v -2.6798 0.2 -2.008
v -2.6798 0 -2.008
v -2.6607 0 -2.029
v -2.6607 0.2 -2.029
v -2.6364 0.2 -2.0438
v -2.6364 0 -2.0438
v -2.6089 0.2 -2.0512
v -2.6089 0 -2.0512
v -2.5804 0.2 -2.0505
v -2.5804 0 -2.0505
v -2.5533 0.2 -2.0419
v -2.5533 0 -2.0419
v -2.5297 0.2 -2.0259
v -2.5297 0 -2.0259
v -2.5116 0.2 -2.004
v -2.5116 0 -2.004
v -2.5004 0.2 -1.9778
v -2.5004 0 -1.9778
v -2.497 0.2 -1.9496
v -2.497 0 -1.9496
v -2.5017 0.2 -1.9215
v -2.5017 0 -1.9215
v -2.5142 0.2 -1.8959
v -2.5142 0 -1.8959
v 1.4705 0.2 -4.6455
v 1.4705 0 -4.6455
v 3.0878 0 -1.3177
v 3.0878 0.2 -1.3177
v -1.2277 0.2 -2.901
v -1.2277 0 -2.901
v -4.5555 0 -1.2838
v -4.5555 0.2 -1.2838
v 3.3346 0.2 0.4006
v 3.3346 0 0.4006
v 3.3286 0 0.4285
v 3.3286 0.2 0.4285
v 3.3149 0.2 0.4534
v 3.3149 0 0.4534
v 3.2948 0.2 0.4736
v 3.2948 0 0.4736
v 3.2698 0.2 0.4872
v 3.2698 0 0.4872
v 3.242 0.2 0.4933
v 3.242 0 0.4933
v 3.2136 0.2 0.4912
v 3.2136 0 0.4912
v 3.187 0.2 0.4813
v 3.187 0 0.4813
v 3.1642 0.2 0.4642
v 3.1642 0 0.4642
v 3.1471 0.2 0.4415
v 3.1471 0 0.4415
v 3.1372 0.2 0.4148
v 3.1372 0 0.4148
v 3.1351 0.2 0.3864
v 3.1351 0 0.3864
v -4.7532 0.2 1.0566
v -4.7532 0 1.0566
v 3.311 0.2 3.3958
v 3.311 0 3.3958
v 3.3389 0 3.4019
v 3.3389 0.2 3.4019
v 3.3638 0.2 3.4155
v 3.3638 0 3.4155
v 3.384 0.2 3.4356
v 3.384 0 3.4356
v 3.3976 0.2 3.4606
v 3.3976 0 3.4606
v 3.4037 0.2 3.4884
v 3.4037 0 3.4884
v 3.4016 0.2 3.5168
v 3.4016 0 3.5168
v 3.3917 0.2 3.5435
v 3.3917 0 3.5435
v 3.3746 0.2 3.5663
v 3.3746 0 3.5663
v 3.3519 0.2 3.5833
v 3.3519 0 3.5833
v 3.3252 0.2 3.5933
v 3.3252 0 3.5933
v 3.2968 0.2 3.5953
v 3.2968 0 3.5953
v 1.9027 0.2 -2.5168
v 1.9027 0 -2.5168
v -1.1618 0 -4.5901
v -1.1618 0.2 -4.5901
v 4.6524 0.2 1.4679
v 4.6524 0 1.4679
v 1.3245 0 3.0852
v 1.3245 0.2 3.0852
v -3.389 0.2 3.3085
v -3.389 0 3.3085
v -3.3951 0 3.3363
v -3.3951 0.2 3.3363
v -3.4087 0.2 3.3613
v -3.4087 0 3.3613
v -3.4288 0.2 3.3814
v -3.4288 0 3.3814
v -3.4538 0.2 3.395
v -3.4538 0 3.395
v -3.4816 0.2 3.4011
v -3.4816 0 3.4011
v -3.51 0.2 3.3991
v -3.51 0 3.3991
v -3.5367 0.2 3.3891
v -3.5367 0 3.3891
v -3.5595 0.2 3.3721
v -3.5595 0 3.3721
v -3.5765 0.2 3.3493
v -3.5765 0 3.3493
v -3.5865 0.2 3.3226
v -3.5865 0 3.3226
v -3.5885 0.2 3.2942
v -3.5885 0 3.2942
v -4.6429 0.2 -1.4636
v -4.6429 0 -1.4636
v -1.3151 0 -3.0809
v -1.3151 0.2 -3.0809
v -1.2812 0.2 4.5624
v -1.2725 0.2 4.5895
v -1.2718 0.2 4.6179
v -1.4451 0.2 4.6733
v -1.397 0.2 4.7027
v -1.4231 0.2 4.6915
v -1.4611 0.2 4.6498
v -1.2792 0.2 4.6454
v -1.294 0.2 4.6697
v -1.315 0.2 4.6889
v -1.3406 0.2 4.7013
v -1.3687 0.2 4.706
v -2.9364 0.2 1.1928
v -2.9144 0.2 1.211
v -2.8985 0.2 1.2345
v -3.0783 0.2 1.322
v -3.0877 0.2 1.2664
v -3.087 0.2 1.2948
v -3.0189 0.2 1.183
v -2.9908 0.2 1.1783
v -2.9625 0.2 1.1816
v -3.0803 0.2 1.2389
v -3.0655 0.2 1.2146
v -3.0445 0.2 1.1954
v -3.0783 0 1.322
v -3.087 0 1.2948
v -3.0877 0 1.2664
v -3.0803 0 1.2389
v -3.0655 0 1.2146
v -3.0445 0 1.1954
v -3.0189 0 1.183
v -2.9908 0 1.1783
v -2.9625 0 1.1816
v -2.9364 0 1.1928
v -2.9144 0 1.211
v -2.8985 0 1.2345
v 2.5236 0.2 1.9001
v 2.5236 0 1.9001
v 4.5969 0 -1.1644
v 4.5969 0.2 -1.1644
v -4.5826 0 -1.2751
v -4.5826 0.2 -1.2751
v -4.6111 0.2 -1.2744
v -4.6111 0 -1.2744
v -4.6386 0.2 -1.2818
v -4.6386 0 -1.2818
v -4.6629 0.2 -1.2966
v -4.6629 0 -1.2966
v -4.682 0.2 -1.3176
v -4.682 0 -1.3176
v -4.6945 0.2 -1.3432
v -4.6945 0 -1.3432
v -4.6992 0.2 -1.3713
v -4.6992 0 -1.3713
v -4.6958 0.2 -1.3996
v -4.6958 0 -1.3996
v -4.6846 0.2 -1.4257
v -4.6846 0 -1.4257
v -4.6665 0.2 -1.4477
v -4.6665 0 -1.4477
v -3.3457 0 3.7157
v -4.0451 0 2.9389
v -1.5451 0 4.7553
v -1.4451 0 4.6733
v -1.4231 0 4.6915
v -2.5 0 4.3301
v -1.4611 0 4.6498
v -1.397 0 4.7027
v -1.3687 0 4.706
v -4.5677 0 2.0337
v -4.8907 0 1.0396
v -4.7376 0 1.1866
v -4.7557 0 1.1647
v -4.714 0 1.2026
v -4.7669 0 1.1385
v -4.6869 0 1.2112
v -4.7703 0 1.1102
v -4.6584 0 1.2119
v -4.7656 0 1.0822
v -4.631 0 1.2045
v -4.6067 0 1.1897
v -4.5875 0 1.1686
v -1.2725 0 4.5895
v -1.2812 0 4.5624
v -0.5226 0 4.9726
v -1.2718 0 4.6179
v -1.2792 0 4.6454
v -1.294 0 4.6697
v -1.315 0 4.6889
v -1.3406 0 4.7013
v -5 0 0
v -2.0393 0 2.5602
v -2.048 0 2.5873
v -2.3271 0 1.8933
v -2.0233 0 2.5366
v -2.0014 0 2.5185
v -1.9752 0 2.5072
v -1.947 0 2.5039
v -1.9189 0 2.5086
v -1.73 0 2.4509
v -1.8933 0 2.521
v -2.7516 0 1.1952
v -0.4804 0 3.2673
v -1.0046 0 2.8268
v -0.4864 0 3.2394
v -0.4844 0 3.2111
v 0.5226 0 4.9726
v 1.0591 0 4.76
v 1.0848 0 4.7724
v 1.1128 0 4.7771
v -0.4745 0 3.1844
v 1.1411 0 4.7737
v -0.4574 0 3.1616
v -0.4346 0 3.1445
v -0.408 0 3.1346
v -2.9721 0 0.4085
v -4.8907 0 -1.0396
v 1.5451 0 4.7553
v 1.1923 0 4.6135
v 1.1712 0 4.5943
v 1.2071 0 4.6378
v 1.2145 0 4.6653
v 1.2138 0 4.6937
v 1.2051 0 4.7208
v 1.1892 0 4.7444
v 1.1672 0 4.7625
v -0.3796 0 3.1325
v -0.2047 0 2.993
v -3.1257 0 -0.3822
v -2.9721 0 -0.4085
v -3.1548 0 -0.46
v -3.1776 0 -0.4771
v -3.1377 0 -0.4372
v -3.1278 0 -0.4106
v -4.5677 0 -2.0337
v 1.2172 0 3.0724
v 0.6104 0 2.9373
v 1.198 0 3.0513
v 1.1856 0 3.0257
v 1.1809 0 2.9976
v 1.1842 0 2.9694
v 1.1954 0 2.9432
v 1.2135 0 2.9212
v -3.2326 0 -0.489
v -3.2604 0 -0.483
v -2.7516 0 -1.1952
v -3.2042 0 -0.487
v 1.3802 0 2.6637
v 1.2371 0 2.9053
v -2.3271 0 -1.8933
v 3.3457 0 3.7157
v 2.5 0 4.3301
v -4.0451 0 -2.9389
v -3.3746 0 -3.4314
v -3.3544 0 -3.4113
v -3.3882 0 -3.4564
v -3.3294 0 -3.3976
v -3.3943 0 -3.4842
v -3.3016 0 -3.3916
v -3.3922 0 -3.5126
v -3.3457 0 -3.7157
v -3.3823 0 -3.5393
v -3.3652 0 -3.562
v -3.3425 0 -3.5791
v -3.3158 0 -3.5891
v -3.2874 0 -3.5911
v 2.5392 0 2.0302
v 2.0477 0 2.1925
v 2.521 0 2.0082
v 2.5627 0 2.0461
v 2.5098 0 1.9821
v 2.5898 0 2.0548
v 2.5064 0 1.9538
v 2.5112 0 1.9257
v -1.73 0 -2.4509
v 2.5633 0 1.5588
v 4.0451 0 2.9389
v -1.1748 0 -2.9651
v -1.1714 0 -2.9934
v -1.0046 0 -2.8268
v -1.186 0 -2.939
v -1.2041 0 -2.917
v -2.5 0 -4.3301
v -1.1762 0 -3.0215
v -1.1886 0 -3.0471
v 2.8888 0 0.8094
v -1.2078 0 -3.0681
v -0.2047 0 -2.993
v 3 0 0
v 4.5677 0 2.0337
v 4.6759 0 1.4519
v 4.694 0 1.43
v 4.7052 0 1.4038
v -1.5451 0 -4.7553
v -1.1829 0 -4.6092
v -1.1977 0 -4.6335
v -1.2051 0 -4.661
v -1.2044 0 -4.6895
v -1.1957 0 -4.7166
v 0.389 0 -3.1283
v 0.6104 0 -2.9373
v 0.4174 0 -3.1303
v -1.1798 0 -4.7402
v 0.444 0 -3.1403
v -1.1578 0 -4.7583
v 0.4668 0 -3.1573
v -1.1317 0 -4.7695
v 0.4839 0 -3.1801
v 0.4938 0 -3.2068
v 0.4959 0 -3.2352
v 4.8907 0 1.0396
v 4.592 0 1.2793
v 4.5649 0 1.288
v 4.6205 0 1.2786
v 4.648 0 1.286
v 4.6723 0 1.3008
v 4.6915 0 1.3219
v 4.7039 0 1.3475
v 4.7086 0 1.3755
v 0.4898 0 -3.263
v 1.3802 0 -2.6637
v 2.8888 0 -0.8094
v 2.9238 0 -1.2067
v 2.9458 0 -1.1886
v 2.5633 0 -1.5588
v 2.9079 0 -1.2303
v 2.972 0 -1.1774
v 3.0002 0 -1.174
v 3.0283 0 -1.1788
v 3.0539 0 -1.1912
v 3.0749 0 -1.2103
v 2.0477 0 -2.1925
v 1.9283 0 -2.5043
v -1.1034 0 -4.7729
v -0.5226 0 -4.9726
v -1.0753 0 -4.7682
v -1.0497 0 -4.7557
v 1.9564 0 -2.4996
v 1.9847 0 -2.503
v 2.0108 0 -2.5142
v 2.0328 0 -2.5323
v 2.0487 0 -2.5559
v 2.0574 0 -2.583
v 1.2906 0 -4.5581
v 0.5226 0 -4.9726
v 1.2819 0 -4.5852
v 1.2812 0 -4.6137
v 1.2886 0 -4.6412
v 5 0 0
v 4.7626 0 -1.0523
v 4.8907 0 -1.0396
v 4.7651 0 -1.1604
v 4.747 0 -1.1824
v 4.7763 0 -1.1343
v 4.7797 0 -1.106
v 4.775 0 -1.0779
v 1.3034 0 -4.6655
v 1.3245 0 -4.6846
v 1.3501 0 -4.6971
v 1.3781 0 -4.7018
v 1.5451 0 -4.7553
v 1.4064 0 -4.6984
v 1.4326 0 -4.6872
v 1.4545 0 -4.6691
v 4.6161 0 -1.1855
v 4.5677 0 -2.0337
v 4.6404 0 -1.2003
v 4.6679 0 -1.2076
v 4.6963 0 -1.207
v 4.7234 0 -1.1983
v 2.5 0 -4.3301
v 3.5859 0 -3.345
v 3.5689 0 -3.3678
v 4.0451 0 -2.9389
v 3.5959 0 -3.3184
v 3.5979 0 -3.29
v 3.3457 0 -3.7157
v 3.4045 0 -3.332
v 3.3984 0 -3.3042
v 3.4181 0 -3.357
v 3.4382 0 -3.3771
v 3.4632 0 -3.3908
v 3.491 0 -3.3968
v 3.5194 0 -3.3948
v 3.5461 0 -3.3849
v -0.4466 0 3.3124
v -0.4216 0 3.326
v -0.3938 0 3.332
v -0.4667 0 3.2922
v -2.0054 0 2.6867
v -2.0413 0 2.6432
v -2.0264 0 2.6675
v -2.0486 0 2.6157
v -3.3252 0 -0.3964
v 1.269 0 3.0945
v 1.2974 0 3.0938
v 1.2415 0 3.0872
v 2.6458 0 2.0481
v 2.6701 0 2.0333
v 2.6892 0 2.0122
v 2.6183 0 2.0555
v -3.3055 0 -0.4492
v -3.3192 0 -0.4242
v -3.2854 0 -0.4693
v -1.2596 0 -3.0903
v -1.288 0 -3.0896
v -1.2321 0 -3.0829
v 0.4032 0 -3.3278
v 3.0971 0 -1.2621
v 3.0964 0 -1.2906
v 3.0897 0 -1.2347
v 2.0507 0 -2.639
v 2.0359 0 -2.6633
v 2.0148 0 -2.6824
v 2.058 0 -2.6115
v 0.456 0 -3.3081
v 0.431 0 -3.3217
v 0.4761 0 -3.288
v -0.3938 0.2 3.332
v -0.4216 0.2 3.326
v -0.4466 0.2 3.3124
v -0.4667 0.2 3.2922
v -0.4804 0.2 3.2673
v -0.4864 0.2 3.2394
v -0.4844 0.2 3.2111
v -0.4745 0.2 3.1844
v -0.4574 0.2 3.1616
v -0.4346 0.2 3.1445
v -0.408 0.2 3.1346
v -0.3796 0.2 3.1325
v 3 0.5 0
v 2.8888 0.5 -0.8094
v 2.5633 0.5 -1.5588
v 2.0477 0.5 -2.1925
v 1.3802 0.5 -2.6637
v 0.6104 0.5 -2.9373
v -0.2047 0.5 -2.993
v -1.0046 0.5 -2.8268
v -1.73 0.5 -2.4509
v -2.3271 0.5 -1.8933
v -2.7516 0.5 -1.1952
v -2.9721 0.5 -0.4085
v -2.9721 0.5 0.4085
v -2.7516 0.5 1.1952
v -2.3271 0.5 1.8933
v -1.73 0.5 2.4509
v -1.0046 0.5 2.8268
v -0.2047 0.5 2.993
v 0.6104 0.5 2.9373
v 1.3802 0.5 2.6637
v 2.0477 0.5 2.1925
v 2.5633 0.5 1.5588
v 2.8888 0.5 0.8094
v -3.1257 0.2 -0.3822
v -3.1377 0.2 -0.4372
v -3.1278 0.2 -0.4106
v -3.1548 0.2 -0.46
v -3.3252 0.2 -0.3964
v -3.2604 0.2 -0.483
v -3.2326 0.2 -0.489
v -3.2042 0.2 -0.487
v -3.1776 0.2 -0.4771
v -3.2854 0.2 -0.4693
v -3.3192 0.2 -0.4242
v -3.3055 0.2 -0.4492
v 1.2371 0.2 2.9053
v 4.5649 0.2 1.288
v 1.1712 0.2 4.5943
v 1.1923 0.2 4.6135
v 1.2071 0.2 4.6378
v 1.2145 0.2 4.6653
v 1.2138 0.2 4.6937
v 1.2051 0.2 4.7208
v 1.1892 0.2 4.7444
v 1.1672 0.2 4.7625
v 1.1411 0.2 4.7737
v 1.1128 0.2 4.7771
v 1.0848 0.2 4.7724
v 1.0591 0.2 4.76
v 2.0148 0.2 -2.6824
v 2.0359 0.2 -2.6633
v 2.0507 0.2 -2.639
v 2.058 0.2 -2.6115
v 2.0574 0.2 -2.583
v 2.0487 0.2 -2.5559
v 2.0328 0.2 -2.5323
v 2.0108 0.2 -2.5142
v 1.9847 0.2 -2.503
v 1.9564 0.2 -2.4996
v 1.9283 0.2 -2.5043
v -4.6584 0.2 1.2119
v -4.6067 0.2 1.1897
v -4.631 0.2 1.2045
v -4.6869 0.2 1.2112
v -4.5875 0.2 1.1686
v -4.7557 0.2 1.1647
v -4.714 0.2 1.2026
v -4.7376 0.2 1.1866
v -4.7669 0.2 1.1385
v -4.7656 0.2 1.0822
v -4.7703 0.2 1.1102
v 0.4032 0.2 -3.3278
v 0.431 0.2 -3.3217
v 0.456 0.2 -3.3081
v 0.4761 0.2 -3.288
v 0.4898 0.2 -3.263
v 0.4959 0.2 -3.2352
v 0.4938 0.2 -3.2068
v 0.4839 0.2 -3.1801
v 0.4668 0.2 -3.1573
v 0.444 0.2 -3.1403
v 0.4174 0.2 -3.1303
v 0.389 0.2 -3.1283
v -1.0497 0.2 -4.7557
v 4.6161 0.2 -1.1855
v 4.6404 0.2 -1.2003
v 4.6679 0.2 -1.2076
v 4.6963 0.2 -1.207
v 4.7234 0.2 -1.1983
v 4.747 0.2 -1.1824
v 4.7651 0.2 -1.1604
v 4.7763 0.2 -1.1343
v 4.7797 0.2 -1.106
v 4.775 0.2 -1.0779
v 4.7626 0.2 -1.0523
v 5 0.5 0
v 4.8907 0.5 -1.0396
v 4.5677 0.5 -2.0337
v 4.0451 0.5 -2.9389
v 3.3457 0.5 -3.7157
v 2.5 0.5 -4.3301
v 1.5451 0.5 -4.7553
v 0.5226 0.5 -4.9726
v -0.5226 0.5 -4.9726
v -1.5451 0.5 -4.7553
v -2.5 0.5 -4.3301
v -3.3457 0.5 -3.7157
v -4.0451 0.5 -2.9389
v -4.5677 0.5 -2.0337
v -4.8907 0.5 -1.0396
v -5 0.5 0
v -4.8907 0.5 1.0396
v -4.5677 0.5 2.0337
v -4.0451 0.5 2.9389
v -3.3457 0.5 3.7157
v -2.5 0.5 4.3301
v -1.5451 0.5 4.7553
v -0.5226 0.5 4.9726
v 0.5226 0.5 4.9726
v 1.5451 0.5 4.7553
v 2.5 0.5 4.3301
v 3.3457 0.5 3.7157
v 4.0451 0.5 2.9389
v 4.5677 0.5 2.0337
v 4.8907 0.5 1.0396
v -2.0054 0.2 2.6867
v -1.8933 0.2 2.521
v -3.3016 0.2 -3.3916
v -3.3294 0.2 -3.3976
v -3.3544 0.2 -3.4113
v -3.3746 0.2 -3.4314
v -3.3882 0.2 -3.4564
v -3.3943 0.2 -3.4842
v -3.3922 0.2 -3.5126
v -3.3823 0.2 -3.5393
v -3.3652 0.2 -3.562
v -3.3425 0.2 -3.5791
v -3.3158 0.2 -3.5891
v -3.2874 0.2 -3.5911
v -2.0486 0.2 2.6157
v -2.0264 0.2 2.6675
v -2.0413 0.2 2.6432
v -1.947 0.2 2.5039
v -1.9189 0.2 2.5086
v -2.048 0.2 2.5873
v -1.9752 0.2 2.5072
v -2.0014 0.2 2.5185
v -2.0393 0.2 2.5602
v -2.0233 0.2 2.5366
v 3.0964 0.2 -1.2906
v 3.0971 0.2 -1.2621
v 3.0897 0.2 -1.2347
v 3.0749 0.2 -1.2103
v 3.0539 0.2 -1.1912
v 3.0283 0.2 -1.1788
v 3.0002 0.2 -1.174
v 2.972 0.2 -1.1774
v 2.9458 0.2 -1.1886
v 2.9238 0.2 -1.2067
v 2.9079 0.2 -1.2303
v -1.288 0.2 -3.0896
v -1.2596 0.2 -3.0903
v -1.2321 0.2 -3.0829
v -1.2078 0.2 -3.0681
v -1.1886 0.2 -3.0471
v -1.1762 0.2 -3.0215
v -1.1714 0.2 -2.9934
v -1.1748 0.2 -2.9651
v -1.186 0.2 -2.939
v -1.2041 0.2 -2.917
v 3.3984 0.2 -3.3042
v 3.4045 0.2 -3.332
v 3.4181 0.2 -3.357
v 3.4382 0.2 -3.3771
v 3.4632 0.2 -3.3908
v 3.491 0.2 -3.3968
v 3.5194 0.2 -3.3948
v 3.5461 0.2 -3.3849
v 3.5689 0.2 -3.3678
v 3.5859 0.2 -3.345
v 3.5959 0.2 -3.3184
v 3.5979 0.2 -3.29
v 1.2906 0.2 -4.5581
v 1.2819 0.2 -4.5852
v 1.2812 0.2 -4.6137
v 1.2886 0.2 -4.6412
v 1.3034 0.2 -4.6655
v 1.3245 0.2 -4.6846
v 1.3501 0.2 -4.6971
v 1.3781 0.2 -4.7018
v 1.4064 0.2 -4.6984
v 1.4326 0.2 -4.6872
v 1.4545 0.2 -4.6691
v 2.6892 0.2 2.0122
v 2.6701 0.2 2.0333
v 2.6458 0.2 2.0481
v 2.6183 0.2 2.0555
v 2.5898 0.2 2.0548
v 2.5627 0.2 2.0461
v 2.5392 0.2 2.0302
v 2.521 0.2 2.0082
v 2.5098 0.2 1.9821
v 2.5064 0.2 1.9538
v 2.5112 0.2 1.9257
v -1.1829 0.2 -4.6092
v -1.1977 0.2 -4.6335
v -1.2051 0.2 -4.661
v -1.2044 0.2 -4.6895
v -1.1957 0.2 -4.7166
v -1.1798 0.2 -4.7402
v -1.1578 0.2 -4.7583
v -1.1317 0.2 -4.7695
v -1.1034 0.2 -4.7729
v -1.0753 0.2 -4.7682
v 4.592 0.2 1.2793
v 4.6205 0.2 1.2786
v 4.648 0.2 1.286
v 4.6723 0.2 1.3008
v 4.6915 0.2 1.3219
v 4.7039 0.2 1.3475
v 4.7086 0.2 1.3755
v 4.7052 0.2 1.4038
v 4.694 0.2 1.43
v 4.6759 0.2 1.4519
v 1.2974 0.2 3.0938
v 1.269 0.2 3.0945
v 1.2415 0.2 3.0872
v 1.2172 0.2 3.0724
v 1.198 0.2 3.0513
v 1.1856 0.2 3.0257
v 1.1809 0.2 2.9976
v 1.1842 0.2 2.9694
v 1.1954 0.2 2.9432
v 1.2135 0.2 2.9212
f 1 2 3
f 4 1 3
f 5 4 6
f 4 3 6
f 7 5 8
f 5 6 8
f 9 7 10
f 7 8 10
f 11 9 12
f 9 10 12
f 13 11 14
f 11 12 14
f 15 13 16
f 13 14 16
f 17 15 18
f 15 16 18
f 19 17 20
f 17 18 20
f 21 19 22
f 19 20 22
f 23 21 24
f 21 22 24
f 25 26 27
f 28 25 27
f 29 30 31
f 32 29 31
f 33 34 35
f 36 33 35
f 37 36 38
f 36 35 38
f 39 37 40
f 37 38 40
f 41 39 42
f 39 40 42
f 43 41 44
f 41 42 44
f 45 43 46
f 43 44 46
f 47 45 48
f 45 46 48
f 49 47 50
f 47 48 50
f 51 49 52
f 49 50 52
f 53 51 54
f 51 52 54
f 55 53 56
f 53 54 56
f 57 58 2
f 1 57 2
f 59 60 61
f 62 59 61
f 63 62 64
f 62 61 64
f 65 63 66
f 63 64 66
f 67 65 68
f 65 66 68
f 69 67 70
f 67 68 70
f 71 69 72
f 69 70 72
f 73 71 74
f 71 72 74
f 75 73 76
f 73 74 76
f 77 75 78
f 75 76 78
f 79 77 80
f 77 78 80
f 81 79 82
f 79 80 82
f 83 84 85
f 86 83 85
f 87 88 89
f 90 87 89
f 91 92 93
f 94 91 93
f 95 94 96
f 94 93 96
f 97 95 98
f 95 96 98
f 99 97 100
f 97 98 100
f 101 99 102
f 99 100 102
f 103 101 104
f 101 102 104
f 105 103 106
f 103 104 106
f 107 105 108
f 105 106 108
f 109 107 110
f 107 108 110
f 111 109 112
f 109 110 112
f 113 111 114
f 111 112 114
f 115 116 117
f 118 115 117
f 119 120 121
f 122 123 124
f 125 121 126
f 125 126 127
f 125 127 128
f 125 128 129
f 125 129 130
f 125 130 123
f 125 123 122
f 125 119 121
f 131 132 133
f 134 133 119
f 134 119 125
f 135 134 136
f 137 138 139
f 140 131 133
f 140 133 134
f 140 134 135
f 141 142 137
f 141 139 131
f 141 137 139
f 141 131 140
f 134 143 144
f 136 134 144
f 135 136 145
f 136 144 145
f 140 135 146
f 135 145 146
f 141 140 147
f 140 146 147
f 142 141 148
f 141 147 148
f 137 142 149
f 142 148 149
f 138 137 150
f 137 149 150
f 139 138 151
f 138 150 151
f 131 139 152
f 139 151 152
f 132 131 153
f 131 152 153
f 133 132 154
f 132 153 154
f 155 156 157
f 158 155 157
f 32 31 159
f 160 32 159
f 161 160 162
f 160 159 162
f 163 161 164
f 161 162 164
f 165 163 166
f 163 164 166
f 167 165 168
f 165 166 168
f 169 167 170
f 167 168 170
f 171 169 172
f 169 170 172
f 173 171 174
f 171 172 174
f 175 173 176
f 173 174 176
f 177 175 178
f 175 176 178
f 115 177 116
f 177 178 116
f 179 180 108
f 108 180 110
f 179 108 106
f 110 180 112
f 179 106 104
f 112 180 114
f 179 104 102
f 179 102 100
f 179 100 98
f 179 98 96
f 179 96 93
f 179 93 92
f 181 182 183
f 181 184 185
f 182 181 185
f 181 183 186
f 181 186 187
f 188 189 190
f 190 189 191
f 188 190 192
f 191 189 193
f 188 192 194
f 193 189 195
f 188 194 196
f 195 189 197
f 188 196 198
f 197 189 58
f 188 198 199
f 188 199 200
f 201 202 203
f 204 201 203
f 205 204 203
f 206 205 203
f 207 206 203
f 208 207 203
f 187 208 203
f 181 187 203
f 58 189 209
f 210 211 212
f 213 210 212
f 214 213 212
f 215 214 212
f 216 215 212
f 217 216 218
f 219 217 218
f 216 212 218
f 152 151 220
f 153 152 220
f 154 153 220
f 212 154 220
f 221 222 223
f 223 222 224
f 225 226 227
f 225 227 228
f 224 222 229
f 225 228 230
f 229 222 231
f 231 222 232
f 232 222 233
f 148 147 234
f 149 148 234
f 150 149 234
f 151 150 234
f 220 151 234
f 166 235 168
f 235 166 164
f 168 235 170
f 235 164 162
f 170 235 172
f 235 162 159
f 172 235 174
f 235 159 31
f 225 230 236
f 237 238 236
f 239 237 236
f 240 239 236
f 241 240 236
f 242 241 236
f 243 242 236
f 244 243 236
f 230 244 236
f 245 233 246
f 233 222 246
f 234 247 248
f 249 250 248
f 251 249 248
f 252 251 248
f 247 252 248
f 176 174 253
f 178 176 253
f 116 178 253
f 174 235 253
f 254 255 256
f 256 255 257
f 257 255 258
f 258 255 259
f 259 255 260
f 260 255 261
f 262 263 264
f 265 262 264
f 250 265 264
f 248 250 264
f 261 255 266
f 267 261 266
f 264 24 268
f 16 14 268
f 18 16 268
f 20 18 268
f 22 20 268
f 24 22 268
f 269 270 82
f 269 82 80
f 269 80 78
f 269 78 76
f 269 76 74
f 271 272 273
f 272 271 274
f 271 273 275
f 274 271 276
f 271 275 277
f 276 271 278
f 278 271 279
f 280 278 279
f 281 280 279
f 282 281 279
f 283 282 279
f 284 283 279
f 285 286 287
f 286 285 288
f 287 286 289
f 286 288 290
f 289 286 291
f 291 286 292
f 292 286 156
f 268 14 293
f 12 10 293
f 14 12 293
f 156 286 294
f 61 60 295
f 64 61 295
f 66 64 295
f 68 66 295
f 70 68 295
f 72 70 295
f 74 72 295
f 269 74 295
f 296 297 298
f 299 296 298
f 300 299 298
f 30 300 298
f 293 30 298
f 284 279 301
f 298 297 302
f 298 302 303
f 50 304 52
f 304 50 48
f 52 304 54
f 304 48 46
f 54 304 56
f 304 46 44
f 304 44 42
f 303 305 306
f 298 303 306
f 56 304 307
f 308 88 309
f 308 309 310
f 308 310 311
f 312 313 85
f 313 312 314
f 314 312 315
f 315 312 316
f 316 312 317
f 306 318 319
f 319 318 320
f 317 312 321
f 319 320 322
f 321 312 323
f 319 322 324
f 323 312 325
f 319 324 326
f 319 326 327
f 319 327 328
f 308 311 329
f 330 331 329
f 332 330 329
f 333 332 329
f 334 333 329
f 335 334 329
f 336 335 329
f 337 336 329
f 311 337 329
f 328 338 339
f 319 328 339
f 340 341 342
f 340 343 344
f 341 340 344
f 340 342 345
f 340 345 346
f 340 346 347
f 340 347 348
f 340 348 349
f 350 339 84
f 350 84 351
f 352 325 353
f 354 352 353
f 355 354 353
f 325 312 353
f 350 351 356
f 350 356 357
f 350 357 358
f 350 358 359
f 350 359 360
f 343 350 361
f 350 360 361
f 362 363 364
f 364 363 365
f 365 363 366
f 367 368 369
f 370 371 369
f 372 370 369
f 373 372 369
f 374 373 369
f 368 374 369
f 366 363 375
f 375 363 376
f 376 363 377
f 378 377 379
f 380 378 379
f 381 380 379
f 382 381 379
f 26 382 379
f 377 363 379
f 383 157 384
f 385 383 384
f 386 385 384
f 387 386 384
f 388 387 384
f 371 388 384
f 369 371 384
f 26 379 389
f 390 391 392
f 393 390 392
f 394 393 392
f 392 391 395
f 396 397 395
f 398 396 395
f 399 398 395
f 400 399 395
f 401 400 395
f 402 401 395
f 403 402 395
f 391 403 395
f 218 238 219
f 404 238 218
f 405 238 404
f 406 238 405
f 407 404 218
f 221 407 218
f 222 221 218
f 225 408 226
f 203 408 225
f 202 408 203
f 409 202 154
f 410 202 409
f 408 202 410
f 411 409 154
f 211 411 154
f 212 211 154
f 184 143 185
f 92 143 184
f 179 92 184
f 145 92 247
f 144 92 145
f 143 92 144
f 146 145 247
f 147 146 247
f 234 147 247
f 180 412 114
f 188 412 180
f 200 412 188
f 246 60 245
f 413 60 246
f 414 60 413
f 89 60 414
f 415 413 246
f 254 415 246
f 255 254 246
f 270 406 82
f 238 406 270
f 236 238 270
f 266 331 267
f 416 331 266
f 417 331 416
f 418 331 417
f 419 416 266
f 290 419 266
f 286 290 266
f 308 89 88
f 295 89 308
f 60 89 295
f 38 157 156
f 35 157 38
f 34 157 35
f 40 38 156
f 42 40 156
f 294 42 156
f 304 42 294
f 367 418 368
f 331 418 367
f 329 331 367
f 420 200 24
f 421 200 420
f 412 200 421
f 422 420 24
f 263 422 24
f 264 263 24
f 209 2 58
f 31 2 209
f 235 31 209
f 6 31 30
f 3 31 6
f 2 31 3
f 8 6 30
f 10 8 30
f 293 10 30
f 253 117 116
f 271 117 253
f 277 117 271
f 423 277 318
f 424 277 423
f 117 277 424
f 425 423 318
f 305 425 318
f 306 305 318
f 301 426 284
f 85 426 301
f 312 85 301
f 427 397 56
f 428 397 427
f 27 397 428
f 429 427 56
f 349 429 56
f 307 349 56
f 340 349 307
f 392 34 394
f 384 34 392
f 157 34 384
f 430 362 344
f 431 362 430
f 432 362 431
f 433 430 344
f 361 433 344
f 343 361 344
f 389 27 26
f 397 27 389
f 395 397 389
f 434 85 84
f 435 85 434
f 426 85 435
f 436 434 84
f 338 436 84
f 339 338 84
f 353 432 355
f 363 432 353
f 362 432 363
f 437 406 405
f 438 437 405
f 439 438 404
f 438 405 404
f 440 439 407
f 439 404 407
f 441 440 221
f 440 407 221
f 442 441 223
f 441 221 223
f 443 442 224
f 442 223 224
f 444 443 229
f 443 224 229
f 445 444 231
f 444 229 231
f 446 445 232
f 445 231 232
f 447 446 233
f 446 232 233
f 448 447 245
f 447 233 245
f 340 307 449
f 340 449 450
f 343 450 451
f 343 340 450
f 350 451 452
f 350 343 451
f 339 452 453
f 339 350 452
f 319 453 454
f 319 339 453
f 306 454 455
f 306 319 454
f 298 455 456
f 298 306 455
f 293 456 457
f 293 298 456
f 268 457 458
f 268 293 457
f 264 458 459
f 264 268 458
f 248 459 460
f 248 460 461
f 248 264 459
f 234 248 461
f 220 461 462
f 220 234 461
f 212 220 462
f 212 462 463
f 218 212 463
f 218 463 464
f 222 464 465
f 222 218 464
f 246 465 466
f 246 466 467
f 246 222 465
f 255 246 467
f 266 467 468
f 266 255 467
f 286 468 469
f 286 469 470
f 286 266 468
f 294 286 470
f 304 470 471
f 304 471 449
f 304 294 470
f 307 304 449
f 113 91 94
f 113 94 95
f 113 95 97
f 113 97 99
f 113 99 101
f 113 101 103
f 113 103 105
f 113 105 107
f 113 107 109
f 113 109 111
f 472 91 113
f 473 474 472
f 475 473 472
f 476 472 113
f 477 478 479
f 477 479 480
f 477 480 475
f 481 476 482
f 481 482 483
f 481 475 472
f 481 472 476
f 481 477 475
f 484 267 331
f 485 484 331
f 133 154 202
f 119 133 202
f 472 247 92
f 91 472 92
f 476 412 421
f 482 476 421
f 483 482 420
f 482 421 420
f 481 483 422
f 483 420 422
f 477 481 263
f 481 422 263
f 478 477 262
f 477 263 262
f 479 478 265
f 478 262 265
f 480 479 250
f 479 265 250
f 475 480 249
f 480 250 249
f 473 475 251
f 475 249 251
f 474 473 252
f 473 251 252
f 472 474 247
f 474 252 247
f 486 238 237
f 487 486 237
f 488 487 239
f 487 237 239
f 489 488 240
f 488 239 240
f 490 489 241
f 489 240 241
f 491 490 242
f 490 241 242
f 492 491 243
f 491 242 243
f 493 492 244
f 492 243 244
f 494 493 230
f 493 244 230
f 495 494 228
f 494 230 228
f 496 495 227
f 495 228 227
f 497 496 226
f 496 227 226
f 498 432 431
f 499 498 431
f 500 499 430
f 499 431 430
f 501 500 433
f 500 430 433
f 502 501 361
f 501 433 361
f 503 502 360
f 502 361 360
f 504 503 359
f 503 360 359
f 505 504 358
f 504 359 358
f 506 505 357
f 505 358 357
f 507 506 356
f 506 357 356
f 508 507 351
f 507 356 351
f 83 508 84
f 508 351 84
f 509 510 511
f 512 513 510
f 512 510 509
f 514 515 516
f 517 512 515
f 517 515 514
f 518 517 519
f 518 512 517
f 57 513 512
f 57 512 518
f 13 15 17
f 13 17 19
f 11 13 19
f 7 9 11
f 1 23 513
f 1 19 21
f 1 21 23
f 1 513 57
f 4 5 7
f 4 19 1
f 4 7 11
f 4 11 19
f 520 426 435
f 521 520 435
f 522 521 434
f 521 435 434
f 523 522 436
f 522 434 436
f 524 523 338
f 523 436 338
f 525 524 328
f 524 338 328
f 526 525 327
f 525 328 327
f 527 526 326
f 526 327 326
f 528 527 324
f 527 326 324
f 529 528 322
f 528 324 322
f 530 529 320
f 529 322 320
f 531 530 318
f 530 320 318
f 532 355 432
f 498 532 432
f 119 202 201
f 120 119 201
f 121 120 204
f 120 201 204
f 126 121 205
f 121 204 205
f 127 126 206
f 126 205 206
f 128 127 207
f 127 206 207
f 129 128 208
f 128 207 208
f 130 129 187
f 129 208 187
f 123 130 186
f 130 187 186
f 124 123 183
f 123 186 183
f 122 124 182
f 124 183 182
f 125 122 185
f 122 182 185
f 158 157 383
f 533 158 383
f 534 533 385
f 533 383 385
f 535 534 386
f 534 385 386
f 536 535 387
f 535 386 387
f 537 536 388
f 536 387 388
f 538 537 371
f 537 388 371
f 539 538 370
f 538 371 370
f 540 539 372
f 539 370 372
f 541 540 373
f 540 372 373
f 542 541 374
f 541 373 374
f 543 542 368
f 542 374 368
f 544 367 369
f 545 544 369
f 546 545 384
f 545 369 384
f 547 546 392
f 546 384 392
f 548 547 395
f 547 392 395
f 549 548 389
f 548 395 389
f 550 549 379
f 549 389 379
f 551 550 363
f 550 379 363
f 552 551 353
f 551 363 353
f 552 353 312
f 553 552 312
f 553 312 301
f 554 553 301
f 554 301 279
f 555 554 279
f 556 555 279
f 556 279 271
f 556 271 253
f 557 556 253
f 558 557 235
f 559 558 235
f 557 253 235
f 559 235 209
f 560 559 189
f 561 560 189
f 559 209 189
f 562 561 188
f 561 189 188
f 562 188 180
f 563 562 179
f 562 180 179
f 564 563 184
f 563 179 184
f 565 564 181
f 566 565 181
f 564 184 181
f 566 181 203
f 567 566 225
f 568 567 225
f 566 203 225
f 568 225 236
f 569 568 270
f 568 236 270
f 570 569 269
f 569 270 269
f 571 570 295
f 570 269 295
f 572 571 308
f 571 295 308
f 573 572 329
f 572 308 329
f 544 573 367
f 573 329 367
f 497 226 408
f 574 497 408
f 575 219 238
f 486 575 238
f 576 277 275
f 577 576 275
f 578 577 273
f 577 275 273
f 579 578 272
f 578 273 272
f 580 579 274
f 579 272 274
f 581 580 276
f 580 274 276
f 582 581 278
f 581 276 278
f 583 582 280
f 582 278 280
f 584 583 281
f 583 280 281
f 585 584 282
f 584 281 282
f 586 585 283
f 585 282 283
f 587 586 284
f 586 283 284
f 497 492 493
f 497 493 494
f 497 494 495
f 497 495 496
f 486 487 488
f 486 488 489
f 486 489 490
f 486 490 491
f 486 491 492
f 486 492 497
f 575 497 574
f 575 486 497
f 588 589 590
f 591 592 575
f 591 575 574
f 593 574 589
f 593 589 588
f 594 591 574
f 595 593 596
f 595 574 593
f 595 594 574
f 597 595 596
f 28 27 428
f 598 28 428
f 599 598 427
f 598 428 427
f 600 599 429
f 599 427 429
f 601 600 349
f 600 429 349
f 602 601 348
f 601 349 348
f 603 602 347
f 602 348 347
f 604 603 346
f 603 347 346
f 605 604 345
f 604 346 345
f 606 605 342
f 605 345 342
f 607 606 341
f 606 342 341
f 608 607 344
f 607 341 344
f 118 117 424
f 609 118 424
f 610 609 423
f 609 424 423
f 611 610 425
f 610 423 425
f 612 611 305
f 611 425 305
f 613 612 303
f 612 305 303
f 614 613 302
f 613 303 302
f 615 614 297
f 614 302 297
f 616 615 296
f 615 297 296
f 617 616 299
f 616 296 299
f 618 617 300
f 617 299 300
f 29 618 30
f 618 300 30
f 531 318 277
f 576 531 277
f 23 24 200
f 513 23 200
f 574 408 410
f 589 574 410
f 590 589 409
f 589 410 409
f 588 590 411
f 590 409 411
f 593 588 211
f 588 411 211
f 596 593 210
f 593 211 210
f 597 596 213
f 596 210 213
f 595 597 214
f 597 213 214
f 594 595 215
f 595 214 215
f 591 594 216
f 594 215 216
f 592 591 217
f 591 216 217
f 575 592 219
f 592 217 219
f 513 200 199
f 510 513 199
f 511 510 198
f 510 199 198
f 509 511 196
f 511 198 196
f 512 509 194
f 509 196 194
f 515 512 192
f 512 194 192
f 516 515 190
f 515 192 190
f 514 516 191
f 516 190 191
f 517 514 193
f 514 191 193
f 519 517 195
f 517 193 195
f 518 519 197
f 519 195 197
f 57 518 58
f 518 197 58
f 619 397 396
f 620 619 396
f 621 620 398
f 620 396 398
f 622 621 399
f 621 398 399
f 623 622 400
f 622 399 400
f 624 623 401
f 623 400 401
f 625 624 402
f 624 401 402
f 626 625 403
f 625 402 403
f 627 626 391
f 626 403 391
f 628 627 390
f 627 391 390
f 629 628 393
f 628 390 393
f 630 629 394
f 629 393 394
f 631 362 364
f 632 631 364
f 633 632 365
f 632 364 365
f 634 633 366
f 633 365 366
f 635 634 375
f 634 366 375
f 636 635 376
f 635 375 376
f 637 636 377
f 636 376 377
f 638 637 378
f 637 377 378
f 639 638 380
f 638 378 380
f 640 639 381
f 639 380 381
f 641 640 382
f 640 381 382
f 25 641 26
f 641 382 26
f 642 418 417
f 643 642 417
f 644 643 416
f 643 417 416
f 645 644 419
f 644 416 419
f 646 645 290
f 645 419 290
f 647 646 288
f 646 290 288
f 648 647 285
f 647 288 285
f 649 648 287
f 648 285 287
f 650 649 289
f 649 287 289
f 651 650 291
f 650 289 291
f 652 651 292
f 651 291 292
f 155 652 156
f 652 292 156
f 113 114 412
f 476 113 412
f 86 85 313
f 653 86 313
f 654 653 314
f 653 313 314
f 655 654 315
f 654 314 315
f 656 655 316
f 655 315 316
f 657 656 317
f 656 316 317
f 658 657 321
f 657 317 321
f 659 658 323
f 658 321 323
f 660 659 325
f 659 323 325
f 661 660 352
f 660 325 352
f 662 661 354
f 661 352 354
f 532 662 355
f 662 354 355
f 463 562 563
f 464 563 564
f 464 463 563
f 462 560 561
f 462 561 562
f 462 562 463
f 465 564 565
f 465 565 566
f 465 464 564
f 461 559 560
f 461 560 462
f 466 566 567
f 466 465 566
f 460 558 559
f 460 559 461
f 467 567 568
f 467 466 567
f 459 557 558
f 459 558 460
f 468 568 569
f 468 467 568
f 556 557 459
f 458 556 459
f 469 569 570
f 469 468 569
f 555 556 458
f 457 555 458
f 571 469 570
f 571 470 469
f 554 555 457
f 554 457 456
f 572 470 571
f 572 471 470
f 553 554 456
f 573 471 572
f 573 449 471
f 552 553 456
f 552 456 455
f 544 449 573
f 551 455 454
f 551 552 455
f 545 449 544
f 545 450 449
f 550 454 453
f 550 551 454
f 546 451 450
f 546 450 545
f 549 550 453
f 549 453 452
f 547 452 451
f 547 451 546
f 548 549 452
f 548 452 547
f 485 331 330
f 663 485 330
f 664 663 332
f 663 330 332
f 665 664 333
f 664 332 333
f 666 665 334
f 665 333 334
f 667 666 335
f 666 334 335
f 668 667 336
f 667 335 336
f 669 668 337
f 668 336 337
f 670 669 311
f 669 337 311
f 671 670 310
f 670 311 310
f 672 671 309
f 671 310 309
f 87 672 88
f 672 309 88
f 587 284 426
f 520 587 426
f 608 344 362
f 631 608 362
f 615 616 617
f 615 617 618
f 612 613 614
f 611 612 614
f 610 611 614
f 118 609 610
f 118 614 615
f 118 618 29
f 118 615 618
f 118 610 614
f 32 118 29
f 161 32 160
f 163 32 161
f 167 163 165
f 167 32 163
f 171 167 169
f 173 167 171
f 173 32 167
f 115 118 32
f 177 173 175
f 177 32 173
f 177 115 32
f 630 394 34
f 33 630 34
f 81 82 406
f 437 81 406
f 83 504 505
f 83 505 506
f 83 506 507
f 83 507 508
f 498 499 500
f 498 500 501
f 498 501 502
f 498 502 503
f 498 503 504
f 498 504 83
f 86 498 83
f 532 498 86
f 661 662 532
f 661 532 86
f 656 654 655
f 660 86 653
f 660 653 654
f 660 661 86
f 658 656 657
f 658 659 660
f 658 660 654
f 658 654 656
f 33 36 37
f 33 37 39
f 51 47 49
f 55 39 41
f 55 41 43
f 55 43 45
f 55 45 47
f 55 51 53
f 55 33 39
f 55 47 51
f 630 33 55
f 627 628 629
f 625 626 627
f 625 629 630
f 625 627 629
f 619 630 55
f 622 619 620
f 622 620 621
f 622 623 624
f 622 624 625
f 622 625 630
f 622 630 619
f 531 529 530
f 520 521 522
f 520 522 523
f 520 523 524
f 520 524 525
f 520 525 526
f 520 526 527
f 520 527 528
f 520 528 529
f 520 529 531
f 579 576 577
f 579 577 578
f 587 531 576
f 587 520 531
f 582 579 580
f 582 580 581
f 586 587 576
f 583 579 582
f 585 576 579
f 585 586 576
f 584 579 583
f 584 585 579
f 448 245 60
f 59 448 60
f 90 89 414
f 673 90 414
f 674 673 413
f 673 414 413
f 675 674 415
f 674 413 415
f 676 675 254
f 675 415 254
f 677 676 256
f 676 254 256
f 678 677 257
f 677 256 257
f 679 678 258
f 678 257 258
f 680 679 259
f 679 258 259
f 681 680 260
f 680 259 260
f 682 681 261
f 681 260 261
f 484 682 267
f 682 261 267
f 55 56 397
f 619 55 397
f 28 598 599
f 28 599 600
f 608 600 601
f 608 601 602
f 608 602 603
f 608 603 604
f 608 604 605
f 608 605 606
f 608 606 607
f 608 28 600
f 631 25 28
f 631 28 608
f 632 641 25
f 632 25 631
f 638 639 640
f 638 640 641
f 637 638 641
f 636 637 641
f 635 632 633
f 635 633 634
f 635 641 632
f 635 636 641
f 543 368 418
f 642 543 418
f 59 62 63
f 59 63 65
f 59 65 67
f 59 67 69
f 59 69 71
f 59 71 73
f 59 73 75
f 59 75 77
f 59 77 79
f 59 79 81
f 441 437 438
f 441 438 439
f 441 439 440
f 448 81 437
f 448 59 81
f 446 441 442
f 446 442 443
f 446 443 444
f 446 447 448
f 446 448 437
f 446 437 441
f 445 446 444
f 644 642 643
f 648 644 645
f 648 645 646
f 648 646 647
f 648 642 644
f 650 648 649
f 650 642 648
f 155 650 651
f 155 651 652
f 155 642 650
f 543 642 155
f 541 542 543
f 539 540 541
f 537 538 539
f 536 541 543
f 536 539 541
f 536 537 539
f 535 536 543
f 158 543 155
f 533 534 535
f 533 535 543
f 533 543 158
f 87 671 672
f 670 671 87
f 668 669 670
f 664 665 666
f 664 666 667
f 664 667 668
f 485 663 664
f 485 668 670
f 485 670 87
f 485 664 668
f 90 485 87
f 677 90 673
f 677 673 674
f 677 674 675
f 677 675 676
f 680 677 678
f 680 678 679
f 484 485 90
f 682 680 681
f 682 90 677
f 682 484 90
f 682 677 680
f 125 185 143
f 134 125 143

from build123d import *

# Parameters (mm, degrees)
SKETCH1_R           = 5
SKETCH1_R_2         = 3
BOSS_EXTRUDE2_DEPTH = 0.5
CUT_EXTRUDE5_DEPTH  = 0.2


with BuildPart() as part:
    # Sketch1 → Boss-Extrude2 (new body)
    with BuildSketch(Plane(origin=(0, 0, 0), x_dir=(1, 0, 0), z_dir=(0, 1, 0))):
        Circle(SKETCH1_R)
        Circle(SKETCH1_R_2, mode=Mode.SUBTRACT)
    extrude(amount=BOSS_EXTRUDE2_DEPTH)

    # Sketch4 → Cut-Extrude5 (cut)
    with BuildSketch(Plane(origin=(0, 0, 0), x_dir=(1, 0, 0), z_dir=(0, 1, 0))):
        with BuildLine():
            Line((-1.227705378, 2.901045691), (-4.555523725, 1.283756278))
            ThreePointArc((-4.555523725, 1.283756278), (-4.689175287, 1.32998679), (-4.642944775, 1.463638351))
            Line((-4.642944775, 1.463638351), (-1.315126427, 3.080927764))
            ThreePointArc((-1.315126427, 3.080927764), (-1.181474866, 3.034697252), (-1.227705378, 2.901045691))
        make_face()
        with BuildLine():
            Line((0.388990404, 3.128300785), (-3.301629531, 3.391596243))
            ThreePointArc((-3.301629531, 3.391596243), (-3.394259922, 3.498458821), (-3.287397344, 3.591089212))
            Line((-3.287397344, 3.591089212), (0.403222591, 3.327793755))
            ThreePointArc((0.403222591, 3.327793755), (0.495852982, 3.220931177), (0.388990404, 3.128300785))
        make_face()
        with BuildLine():
            Line((1.902717568, 2.516761579), (-1.161805322, 4.590092101))
            ThreePointArc((-1.161805322, 4.590092101), (-1.188594305, 4.728953005), (-1.049733402, 4.755741987))
            Line((-1.049733402, 4.755741987), (2.014789488, 2.682411465))
            ThreePointArc((2.014789488, 2.682411465), (2.041578471, 2.543550562), (1.902717568, 2.516761579))
        make_face()
        with BuildLine():
            Line((2.907874144, 1.230289509), (1.290584731, 4.558107857))
            ThreePointArc((1.290584731, 4.558107857), (1.336815243, 4.691759418), (1.470466804, 4.645528907))
            Line((1.470466804, 4.645528907), (3.087756217, 1.317710559))
            ThreePointArc((3.087756217, 1.317710559), (3.041525705, 1.184058998), (2.907874144, 1.230289509))
        make_face()
        with BuildLine():
            Line((3.135129238, -0.386406272), (3.398424696, 3.304213663))
            ThreePointArc((3.398424696, 3.304213663), (3.505287274, 3.396844054), (3.597917665, 3.289981476))
            Line((3.597917665, 3.289981476), (3.334622208, -0.400638459))
            ThreePointArc((3.334622208, -0.400638459), (3.22775963, -0.49326885), (3.135129238, -0.386406272))
        make_face()
        with BuildLine():
            Line((2.523590032, -1.900133436), (4.596920554, 1.164389454))
            ThreePointArc((4.596920554, 1.164389454), (4.735781458, 1.191178437), (4.76257044, 1.052317534))
            Line((4.76257044, 1.052317534), (2.689239918, -2.012205357))
            ThreePointArc((2.689239918, -2.012205357), (2.550379015, -2.038994339), (2.523590032, -1.900133436))
        make_face()
        with BuildLine():
            Line((1.237117962, -2.905290012), (4.56493631, -1.2880006))
            ThreePointArc((4.56493631, -1.2880006), (4.698587871, -1.334231111), (4.65235736, -1.467882672))
            Line((4.65235736, -1.467882672), (1.324539012, -3.085172085))
            ThreePointArc((1.324539012, -3.085172085), (1.190887451, -3.038941573), (1.237117962, -2.905290012))
        make_face()
        with BuildLine():
            Line((-0.379577819, -3.132545106), (3.311042116, -3.395840564))
            ThreePointArc((3.311042116, -3.395840564), (3.403672507, -3.502703142), (3.296809929, -3.595333533))
            Line((3.296809929, -3.595333533), (-0.393810006, -3.332038076))
            ThreePointArc((-0.393810006, -3.332038076), (-0.486440397, -3.225175498), (-0.379577819, -3.132545106))
        make_face()
        with BuildLine():
            Line((-1.893304983, -2.521005901), (1.171217907, -4.594336423))
            ThreePointArc((1.171217907, -4.594336423), (1.19800689, -4.733197326), (1.059145987, -4.759986309))
            Line((1.059145987, -4.759986309), (-2.005376904, -2.686655787))
            ThreePointArc((-2.005376904, -2.686655787), (-2.032165886, -2.547794883), (-1.893304983, -2.521005901))
        make_face()
        with BuildLine():
            Line((-2.898461559, -1.234533831), (-1.281172147, -4.562352178))
            ThreePointArc((-1.281172147, -4.562352178), (-1.327402658, -4.69600374), (-1.461054219, -4.649773228))
            Line((-1.461054219, -4.649773228), (-3.078343632, -1.32195488))
            ThreePointArc((-3.078343632, -1.32195488), (-3.03211312, -1.188303319), (-2.898461559, -1.234533831))
        make_face()
        with BuildLine():
            Line((-3.125716653, 0.382161951), (-3.389012111, -3.308457984))
            ThreePointArc((-3.389012111, -3.308457984), (-3.495874689, -3.401088375), (-3.58850508, -3.294225797))
            Line((-3.58850508, -3.294225797), (-3.325209623, 0.396394138))
            ThreePointArc((-3.325209623, 0.396394138), (-3.218347045, 0.489024529), (-3.125716653, 0.382161951))
        make_face()
        with BuildLine():
            Line((-2.514177448, 1.895889115), (-4.58750797, -1.168633775))
            ThreePointArc((-4.58750797, -1.168633775), (-4.726368873, -1.195422758), (-4.753157856, -1.056561855))
            Line((-4.753157856, -1.056561855), (-2.679827334, 2.007961035))
            ThreePointArc((-2.679827334, 2.007961035), (-2.54096643, 2.034750018), (-2.514177448, 1.895889115))
        make_face()
    extrude(amount=CUT_EXTRUDE5_DEPTH, mode=Mode.SUBTRACT)


solid = part.part
